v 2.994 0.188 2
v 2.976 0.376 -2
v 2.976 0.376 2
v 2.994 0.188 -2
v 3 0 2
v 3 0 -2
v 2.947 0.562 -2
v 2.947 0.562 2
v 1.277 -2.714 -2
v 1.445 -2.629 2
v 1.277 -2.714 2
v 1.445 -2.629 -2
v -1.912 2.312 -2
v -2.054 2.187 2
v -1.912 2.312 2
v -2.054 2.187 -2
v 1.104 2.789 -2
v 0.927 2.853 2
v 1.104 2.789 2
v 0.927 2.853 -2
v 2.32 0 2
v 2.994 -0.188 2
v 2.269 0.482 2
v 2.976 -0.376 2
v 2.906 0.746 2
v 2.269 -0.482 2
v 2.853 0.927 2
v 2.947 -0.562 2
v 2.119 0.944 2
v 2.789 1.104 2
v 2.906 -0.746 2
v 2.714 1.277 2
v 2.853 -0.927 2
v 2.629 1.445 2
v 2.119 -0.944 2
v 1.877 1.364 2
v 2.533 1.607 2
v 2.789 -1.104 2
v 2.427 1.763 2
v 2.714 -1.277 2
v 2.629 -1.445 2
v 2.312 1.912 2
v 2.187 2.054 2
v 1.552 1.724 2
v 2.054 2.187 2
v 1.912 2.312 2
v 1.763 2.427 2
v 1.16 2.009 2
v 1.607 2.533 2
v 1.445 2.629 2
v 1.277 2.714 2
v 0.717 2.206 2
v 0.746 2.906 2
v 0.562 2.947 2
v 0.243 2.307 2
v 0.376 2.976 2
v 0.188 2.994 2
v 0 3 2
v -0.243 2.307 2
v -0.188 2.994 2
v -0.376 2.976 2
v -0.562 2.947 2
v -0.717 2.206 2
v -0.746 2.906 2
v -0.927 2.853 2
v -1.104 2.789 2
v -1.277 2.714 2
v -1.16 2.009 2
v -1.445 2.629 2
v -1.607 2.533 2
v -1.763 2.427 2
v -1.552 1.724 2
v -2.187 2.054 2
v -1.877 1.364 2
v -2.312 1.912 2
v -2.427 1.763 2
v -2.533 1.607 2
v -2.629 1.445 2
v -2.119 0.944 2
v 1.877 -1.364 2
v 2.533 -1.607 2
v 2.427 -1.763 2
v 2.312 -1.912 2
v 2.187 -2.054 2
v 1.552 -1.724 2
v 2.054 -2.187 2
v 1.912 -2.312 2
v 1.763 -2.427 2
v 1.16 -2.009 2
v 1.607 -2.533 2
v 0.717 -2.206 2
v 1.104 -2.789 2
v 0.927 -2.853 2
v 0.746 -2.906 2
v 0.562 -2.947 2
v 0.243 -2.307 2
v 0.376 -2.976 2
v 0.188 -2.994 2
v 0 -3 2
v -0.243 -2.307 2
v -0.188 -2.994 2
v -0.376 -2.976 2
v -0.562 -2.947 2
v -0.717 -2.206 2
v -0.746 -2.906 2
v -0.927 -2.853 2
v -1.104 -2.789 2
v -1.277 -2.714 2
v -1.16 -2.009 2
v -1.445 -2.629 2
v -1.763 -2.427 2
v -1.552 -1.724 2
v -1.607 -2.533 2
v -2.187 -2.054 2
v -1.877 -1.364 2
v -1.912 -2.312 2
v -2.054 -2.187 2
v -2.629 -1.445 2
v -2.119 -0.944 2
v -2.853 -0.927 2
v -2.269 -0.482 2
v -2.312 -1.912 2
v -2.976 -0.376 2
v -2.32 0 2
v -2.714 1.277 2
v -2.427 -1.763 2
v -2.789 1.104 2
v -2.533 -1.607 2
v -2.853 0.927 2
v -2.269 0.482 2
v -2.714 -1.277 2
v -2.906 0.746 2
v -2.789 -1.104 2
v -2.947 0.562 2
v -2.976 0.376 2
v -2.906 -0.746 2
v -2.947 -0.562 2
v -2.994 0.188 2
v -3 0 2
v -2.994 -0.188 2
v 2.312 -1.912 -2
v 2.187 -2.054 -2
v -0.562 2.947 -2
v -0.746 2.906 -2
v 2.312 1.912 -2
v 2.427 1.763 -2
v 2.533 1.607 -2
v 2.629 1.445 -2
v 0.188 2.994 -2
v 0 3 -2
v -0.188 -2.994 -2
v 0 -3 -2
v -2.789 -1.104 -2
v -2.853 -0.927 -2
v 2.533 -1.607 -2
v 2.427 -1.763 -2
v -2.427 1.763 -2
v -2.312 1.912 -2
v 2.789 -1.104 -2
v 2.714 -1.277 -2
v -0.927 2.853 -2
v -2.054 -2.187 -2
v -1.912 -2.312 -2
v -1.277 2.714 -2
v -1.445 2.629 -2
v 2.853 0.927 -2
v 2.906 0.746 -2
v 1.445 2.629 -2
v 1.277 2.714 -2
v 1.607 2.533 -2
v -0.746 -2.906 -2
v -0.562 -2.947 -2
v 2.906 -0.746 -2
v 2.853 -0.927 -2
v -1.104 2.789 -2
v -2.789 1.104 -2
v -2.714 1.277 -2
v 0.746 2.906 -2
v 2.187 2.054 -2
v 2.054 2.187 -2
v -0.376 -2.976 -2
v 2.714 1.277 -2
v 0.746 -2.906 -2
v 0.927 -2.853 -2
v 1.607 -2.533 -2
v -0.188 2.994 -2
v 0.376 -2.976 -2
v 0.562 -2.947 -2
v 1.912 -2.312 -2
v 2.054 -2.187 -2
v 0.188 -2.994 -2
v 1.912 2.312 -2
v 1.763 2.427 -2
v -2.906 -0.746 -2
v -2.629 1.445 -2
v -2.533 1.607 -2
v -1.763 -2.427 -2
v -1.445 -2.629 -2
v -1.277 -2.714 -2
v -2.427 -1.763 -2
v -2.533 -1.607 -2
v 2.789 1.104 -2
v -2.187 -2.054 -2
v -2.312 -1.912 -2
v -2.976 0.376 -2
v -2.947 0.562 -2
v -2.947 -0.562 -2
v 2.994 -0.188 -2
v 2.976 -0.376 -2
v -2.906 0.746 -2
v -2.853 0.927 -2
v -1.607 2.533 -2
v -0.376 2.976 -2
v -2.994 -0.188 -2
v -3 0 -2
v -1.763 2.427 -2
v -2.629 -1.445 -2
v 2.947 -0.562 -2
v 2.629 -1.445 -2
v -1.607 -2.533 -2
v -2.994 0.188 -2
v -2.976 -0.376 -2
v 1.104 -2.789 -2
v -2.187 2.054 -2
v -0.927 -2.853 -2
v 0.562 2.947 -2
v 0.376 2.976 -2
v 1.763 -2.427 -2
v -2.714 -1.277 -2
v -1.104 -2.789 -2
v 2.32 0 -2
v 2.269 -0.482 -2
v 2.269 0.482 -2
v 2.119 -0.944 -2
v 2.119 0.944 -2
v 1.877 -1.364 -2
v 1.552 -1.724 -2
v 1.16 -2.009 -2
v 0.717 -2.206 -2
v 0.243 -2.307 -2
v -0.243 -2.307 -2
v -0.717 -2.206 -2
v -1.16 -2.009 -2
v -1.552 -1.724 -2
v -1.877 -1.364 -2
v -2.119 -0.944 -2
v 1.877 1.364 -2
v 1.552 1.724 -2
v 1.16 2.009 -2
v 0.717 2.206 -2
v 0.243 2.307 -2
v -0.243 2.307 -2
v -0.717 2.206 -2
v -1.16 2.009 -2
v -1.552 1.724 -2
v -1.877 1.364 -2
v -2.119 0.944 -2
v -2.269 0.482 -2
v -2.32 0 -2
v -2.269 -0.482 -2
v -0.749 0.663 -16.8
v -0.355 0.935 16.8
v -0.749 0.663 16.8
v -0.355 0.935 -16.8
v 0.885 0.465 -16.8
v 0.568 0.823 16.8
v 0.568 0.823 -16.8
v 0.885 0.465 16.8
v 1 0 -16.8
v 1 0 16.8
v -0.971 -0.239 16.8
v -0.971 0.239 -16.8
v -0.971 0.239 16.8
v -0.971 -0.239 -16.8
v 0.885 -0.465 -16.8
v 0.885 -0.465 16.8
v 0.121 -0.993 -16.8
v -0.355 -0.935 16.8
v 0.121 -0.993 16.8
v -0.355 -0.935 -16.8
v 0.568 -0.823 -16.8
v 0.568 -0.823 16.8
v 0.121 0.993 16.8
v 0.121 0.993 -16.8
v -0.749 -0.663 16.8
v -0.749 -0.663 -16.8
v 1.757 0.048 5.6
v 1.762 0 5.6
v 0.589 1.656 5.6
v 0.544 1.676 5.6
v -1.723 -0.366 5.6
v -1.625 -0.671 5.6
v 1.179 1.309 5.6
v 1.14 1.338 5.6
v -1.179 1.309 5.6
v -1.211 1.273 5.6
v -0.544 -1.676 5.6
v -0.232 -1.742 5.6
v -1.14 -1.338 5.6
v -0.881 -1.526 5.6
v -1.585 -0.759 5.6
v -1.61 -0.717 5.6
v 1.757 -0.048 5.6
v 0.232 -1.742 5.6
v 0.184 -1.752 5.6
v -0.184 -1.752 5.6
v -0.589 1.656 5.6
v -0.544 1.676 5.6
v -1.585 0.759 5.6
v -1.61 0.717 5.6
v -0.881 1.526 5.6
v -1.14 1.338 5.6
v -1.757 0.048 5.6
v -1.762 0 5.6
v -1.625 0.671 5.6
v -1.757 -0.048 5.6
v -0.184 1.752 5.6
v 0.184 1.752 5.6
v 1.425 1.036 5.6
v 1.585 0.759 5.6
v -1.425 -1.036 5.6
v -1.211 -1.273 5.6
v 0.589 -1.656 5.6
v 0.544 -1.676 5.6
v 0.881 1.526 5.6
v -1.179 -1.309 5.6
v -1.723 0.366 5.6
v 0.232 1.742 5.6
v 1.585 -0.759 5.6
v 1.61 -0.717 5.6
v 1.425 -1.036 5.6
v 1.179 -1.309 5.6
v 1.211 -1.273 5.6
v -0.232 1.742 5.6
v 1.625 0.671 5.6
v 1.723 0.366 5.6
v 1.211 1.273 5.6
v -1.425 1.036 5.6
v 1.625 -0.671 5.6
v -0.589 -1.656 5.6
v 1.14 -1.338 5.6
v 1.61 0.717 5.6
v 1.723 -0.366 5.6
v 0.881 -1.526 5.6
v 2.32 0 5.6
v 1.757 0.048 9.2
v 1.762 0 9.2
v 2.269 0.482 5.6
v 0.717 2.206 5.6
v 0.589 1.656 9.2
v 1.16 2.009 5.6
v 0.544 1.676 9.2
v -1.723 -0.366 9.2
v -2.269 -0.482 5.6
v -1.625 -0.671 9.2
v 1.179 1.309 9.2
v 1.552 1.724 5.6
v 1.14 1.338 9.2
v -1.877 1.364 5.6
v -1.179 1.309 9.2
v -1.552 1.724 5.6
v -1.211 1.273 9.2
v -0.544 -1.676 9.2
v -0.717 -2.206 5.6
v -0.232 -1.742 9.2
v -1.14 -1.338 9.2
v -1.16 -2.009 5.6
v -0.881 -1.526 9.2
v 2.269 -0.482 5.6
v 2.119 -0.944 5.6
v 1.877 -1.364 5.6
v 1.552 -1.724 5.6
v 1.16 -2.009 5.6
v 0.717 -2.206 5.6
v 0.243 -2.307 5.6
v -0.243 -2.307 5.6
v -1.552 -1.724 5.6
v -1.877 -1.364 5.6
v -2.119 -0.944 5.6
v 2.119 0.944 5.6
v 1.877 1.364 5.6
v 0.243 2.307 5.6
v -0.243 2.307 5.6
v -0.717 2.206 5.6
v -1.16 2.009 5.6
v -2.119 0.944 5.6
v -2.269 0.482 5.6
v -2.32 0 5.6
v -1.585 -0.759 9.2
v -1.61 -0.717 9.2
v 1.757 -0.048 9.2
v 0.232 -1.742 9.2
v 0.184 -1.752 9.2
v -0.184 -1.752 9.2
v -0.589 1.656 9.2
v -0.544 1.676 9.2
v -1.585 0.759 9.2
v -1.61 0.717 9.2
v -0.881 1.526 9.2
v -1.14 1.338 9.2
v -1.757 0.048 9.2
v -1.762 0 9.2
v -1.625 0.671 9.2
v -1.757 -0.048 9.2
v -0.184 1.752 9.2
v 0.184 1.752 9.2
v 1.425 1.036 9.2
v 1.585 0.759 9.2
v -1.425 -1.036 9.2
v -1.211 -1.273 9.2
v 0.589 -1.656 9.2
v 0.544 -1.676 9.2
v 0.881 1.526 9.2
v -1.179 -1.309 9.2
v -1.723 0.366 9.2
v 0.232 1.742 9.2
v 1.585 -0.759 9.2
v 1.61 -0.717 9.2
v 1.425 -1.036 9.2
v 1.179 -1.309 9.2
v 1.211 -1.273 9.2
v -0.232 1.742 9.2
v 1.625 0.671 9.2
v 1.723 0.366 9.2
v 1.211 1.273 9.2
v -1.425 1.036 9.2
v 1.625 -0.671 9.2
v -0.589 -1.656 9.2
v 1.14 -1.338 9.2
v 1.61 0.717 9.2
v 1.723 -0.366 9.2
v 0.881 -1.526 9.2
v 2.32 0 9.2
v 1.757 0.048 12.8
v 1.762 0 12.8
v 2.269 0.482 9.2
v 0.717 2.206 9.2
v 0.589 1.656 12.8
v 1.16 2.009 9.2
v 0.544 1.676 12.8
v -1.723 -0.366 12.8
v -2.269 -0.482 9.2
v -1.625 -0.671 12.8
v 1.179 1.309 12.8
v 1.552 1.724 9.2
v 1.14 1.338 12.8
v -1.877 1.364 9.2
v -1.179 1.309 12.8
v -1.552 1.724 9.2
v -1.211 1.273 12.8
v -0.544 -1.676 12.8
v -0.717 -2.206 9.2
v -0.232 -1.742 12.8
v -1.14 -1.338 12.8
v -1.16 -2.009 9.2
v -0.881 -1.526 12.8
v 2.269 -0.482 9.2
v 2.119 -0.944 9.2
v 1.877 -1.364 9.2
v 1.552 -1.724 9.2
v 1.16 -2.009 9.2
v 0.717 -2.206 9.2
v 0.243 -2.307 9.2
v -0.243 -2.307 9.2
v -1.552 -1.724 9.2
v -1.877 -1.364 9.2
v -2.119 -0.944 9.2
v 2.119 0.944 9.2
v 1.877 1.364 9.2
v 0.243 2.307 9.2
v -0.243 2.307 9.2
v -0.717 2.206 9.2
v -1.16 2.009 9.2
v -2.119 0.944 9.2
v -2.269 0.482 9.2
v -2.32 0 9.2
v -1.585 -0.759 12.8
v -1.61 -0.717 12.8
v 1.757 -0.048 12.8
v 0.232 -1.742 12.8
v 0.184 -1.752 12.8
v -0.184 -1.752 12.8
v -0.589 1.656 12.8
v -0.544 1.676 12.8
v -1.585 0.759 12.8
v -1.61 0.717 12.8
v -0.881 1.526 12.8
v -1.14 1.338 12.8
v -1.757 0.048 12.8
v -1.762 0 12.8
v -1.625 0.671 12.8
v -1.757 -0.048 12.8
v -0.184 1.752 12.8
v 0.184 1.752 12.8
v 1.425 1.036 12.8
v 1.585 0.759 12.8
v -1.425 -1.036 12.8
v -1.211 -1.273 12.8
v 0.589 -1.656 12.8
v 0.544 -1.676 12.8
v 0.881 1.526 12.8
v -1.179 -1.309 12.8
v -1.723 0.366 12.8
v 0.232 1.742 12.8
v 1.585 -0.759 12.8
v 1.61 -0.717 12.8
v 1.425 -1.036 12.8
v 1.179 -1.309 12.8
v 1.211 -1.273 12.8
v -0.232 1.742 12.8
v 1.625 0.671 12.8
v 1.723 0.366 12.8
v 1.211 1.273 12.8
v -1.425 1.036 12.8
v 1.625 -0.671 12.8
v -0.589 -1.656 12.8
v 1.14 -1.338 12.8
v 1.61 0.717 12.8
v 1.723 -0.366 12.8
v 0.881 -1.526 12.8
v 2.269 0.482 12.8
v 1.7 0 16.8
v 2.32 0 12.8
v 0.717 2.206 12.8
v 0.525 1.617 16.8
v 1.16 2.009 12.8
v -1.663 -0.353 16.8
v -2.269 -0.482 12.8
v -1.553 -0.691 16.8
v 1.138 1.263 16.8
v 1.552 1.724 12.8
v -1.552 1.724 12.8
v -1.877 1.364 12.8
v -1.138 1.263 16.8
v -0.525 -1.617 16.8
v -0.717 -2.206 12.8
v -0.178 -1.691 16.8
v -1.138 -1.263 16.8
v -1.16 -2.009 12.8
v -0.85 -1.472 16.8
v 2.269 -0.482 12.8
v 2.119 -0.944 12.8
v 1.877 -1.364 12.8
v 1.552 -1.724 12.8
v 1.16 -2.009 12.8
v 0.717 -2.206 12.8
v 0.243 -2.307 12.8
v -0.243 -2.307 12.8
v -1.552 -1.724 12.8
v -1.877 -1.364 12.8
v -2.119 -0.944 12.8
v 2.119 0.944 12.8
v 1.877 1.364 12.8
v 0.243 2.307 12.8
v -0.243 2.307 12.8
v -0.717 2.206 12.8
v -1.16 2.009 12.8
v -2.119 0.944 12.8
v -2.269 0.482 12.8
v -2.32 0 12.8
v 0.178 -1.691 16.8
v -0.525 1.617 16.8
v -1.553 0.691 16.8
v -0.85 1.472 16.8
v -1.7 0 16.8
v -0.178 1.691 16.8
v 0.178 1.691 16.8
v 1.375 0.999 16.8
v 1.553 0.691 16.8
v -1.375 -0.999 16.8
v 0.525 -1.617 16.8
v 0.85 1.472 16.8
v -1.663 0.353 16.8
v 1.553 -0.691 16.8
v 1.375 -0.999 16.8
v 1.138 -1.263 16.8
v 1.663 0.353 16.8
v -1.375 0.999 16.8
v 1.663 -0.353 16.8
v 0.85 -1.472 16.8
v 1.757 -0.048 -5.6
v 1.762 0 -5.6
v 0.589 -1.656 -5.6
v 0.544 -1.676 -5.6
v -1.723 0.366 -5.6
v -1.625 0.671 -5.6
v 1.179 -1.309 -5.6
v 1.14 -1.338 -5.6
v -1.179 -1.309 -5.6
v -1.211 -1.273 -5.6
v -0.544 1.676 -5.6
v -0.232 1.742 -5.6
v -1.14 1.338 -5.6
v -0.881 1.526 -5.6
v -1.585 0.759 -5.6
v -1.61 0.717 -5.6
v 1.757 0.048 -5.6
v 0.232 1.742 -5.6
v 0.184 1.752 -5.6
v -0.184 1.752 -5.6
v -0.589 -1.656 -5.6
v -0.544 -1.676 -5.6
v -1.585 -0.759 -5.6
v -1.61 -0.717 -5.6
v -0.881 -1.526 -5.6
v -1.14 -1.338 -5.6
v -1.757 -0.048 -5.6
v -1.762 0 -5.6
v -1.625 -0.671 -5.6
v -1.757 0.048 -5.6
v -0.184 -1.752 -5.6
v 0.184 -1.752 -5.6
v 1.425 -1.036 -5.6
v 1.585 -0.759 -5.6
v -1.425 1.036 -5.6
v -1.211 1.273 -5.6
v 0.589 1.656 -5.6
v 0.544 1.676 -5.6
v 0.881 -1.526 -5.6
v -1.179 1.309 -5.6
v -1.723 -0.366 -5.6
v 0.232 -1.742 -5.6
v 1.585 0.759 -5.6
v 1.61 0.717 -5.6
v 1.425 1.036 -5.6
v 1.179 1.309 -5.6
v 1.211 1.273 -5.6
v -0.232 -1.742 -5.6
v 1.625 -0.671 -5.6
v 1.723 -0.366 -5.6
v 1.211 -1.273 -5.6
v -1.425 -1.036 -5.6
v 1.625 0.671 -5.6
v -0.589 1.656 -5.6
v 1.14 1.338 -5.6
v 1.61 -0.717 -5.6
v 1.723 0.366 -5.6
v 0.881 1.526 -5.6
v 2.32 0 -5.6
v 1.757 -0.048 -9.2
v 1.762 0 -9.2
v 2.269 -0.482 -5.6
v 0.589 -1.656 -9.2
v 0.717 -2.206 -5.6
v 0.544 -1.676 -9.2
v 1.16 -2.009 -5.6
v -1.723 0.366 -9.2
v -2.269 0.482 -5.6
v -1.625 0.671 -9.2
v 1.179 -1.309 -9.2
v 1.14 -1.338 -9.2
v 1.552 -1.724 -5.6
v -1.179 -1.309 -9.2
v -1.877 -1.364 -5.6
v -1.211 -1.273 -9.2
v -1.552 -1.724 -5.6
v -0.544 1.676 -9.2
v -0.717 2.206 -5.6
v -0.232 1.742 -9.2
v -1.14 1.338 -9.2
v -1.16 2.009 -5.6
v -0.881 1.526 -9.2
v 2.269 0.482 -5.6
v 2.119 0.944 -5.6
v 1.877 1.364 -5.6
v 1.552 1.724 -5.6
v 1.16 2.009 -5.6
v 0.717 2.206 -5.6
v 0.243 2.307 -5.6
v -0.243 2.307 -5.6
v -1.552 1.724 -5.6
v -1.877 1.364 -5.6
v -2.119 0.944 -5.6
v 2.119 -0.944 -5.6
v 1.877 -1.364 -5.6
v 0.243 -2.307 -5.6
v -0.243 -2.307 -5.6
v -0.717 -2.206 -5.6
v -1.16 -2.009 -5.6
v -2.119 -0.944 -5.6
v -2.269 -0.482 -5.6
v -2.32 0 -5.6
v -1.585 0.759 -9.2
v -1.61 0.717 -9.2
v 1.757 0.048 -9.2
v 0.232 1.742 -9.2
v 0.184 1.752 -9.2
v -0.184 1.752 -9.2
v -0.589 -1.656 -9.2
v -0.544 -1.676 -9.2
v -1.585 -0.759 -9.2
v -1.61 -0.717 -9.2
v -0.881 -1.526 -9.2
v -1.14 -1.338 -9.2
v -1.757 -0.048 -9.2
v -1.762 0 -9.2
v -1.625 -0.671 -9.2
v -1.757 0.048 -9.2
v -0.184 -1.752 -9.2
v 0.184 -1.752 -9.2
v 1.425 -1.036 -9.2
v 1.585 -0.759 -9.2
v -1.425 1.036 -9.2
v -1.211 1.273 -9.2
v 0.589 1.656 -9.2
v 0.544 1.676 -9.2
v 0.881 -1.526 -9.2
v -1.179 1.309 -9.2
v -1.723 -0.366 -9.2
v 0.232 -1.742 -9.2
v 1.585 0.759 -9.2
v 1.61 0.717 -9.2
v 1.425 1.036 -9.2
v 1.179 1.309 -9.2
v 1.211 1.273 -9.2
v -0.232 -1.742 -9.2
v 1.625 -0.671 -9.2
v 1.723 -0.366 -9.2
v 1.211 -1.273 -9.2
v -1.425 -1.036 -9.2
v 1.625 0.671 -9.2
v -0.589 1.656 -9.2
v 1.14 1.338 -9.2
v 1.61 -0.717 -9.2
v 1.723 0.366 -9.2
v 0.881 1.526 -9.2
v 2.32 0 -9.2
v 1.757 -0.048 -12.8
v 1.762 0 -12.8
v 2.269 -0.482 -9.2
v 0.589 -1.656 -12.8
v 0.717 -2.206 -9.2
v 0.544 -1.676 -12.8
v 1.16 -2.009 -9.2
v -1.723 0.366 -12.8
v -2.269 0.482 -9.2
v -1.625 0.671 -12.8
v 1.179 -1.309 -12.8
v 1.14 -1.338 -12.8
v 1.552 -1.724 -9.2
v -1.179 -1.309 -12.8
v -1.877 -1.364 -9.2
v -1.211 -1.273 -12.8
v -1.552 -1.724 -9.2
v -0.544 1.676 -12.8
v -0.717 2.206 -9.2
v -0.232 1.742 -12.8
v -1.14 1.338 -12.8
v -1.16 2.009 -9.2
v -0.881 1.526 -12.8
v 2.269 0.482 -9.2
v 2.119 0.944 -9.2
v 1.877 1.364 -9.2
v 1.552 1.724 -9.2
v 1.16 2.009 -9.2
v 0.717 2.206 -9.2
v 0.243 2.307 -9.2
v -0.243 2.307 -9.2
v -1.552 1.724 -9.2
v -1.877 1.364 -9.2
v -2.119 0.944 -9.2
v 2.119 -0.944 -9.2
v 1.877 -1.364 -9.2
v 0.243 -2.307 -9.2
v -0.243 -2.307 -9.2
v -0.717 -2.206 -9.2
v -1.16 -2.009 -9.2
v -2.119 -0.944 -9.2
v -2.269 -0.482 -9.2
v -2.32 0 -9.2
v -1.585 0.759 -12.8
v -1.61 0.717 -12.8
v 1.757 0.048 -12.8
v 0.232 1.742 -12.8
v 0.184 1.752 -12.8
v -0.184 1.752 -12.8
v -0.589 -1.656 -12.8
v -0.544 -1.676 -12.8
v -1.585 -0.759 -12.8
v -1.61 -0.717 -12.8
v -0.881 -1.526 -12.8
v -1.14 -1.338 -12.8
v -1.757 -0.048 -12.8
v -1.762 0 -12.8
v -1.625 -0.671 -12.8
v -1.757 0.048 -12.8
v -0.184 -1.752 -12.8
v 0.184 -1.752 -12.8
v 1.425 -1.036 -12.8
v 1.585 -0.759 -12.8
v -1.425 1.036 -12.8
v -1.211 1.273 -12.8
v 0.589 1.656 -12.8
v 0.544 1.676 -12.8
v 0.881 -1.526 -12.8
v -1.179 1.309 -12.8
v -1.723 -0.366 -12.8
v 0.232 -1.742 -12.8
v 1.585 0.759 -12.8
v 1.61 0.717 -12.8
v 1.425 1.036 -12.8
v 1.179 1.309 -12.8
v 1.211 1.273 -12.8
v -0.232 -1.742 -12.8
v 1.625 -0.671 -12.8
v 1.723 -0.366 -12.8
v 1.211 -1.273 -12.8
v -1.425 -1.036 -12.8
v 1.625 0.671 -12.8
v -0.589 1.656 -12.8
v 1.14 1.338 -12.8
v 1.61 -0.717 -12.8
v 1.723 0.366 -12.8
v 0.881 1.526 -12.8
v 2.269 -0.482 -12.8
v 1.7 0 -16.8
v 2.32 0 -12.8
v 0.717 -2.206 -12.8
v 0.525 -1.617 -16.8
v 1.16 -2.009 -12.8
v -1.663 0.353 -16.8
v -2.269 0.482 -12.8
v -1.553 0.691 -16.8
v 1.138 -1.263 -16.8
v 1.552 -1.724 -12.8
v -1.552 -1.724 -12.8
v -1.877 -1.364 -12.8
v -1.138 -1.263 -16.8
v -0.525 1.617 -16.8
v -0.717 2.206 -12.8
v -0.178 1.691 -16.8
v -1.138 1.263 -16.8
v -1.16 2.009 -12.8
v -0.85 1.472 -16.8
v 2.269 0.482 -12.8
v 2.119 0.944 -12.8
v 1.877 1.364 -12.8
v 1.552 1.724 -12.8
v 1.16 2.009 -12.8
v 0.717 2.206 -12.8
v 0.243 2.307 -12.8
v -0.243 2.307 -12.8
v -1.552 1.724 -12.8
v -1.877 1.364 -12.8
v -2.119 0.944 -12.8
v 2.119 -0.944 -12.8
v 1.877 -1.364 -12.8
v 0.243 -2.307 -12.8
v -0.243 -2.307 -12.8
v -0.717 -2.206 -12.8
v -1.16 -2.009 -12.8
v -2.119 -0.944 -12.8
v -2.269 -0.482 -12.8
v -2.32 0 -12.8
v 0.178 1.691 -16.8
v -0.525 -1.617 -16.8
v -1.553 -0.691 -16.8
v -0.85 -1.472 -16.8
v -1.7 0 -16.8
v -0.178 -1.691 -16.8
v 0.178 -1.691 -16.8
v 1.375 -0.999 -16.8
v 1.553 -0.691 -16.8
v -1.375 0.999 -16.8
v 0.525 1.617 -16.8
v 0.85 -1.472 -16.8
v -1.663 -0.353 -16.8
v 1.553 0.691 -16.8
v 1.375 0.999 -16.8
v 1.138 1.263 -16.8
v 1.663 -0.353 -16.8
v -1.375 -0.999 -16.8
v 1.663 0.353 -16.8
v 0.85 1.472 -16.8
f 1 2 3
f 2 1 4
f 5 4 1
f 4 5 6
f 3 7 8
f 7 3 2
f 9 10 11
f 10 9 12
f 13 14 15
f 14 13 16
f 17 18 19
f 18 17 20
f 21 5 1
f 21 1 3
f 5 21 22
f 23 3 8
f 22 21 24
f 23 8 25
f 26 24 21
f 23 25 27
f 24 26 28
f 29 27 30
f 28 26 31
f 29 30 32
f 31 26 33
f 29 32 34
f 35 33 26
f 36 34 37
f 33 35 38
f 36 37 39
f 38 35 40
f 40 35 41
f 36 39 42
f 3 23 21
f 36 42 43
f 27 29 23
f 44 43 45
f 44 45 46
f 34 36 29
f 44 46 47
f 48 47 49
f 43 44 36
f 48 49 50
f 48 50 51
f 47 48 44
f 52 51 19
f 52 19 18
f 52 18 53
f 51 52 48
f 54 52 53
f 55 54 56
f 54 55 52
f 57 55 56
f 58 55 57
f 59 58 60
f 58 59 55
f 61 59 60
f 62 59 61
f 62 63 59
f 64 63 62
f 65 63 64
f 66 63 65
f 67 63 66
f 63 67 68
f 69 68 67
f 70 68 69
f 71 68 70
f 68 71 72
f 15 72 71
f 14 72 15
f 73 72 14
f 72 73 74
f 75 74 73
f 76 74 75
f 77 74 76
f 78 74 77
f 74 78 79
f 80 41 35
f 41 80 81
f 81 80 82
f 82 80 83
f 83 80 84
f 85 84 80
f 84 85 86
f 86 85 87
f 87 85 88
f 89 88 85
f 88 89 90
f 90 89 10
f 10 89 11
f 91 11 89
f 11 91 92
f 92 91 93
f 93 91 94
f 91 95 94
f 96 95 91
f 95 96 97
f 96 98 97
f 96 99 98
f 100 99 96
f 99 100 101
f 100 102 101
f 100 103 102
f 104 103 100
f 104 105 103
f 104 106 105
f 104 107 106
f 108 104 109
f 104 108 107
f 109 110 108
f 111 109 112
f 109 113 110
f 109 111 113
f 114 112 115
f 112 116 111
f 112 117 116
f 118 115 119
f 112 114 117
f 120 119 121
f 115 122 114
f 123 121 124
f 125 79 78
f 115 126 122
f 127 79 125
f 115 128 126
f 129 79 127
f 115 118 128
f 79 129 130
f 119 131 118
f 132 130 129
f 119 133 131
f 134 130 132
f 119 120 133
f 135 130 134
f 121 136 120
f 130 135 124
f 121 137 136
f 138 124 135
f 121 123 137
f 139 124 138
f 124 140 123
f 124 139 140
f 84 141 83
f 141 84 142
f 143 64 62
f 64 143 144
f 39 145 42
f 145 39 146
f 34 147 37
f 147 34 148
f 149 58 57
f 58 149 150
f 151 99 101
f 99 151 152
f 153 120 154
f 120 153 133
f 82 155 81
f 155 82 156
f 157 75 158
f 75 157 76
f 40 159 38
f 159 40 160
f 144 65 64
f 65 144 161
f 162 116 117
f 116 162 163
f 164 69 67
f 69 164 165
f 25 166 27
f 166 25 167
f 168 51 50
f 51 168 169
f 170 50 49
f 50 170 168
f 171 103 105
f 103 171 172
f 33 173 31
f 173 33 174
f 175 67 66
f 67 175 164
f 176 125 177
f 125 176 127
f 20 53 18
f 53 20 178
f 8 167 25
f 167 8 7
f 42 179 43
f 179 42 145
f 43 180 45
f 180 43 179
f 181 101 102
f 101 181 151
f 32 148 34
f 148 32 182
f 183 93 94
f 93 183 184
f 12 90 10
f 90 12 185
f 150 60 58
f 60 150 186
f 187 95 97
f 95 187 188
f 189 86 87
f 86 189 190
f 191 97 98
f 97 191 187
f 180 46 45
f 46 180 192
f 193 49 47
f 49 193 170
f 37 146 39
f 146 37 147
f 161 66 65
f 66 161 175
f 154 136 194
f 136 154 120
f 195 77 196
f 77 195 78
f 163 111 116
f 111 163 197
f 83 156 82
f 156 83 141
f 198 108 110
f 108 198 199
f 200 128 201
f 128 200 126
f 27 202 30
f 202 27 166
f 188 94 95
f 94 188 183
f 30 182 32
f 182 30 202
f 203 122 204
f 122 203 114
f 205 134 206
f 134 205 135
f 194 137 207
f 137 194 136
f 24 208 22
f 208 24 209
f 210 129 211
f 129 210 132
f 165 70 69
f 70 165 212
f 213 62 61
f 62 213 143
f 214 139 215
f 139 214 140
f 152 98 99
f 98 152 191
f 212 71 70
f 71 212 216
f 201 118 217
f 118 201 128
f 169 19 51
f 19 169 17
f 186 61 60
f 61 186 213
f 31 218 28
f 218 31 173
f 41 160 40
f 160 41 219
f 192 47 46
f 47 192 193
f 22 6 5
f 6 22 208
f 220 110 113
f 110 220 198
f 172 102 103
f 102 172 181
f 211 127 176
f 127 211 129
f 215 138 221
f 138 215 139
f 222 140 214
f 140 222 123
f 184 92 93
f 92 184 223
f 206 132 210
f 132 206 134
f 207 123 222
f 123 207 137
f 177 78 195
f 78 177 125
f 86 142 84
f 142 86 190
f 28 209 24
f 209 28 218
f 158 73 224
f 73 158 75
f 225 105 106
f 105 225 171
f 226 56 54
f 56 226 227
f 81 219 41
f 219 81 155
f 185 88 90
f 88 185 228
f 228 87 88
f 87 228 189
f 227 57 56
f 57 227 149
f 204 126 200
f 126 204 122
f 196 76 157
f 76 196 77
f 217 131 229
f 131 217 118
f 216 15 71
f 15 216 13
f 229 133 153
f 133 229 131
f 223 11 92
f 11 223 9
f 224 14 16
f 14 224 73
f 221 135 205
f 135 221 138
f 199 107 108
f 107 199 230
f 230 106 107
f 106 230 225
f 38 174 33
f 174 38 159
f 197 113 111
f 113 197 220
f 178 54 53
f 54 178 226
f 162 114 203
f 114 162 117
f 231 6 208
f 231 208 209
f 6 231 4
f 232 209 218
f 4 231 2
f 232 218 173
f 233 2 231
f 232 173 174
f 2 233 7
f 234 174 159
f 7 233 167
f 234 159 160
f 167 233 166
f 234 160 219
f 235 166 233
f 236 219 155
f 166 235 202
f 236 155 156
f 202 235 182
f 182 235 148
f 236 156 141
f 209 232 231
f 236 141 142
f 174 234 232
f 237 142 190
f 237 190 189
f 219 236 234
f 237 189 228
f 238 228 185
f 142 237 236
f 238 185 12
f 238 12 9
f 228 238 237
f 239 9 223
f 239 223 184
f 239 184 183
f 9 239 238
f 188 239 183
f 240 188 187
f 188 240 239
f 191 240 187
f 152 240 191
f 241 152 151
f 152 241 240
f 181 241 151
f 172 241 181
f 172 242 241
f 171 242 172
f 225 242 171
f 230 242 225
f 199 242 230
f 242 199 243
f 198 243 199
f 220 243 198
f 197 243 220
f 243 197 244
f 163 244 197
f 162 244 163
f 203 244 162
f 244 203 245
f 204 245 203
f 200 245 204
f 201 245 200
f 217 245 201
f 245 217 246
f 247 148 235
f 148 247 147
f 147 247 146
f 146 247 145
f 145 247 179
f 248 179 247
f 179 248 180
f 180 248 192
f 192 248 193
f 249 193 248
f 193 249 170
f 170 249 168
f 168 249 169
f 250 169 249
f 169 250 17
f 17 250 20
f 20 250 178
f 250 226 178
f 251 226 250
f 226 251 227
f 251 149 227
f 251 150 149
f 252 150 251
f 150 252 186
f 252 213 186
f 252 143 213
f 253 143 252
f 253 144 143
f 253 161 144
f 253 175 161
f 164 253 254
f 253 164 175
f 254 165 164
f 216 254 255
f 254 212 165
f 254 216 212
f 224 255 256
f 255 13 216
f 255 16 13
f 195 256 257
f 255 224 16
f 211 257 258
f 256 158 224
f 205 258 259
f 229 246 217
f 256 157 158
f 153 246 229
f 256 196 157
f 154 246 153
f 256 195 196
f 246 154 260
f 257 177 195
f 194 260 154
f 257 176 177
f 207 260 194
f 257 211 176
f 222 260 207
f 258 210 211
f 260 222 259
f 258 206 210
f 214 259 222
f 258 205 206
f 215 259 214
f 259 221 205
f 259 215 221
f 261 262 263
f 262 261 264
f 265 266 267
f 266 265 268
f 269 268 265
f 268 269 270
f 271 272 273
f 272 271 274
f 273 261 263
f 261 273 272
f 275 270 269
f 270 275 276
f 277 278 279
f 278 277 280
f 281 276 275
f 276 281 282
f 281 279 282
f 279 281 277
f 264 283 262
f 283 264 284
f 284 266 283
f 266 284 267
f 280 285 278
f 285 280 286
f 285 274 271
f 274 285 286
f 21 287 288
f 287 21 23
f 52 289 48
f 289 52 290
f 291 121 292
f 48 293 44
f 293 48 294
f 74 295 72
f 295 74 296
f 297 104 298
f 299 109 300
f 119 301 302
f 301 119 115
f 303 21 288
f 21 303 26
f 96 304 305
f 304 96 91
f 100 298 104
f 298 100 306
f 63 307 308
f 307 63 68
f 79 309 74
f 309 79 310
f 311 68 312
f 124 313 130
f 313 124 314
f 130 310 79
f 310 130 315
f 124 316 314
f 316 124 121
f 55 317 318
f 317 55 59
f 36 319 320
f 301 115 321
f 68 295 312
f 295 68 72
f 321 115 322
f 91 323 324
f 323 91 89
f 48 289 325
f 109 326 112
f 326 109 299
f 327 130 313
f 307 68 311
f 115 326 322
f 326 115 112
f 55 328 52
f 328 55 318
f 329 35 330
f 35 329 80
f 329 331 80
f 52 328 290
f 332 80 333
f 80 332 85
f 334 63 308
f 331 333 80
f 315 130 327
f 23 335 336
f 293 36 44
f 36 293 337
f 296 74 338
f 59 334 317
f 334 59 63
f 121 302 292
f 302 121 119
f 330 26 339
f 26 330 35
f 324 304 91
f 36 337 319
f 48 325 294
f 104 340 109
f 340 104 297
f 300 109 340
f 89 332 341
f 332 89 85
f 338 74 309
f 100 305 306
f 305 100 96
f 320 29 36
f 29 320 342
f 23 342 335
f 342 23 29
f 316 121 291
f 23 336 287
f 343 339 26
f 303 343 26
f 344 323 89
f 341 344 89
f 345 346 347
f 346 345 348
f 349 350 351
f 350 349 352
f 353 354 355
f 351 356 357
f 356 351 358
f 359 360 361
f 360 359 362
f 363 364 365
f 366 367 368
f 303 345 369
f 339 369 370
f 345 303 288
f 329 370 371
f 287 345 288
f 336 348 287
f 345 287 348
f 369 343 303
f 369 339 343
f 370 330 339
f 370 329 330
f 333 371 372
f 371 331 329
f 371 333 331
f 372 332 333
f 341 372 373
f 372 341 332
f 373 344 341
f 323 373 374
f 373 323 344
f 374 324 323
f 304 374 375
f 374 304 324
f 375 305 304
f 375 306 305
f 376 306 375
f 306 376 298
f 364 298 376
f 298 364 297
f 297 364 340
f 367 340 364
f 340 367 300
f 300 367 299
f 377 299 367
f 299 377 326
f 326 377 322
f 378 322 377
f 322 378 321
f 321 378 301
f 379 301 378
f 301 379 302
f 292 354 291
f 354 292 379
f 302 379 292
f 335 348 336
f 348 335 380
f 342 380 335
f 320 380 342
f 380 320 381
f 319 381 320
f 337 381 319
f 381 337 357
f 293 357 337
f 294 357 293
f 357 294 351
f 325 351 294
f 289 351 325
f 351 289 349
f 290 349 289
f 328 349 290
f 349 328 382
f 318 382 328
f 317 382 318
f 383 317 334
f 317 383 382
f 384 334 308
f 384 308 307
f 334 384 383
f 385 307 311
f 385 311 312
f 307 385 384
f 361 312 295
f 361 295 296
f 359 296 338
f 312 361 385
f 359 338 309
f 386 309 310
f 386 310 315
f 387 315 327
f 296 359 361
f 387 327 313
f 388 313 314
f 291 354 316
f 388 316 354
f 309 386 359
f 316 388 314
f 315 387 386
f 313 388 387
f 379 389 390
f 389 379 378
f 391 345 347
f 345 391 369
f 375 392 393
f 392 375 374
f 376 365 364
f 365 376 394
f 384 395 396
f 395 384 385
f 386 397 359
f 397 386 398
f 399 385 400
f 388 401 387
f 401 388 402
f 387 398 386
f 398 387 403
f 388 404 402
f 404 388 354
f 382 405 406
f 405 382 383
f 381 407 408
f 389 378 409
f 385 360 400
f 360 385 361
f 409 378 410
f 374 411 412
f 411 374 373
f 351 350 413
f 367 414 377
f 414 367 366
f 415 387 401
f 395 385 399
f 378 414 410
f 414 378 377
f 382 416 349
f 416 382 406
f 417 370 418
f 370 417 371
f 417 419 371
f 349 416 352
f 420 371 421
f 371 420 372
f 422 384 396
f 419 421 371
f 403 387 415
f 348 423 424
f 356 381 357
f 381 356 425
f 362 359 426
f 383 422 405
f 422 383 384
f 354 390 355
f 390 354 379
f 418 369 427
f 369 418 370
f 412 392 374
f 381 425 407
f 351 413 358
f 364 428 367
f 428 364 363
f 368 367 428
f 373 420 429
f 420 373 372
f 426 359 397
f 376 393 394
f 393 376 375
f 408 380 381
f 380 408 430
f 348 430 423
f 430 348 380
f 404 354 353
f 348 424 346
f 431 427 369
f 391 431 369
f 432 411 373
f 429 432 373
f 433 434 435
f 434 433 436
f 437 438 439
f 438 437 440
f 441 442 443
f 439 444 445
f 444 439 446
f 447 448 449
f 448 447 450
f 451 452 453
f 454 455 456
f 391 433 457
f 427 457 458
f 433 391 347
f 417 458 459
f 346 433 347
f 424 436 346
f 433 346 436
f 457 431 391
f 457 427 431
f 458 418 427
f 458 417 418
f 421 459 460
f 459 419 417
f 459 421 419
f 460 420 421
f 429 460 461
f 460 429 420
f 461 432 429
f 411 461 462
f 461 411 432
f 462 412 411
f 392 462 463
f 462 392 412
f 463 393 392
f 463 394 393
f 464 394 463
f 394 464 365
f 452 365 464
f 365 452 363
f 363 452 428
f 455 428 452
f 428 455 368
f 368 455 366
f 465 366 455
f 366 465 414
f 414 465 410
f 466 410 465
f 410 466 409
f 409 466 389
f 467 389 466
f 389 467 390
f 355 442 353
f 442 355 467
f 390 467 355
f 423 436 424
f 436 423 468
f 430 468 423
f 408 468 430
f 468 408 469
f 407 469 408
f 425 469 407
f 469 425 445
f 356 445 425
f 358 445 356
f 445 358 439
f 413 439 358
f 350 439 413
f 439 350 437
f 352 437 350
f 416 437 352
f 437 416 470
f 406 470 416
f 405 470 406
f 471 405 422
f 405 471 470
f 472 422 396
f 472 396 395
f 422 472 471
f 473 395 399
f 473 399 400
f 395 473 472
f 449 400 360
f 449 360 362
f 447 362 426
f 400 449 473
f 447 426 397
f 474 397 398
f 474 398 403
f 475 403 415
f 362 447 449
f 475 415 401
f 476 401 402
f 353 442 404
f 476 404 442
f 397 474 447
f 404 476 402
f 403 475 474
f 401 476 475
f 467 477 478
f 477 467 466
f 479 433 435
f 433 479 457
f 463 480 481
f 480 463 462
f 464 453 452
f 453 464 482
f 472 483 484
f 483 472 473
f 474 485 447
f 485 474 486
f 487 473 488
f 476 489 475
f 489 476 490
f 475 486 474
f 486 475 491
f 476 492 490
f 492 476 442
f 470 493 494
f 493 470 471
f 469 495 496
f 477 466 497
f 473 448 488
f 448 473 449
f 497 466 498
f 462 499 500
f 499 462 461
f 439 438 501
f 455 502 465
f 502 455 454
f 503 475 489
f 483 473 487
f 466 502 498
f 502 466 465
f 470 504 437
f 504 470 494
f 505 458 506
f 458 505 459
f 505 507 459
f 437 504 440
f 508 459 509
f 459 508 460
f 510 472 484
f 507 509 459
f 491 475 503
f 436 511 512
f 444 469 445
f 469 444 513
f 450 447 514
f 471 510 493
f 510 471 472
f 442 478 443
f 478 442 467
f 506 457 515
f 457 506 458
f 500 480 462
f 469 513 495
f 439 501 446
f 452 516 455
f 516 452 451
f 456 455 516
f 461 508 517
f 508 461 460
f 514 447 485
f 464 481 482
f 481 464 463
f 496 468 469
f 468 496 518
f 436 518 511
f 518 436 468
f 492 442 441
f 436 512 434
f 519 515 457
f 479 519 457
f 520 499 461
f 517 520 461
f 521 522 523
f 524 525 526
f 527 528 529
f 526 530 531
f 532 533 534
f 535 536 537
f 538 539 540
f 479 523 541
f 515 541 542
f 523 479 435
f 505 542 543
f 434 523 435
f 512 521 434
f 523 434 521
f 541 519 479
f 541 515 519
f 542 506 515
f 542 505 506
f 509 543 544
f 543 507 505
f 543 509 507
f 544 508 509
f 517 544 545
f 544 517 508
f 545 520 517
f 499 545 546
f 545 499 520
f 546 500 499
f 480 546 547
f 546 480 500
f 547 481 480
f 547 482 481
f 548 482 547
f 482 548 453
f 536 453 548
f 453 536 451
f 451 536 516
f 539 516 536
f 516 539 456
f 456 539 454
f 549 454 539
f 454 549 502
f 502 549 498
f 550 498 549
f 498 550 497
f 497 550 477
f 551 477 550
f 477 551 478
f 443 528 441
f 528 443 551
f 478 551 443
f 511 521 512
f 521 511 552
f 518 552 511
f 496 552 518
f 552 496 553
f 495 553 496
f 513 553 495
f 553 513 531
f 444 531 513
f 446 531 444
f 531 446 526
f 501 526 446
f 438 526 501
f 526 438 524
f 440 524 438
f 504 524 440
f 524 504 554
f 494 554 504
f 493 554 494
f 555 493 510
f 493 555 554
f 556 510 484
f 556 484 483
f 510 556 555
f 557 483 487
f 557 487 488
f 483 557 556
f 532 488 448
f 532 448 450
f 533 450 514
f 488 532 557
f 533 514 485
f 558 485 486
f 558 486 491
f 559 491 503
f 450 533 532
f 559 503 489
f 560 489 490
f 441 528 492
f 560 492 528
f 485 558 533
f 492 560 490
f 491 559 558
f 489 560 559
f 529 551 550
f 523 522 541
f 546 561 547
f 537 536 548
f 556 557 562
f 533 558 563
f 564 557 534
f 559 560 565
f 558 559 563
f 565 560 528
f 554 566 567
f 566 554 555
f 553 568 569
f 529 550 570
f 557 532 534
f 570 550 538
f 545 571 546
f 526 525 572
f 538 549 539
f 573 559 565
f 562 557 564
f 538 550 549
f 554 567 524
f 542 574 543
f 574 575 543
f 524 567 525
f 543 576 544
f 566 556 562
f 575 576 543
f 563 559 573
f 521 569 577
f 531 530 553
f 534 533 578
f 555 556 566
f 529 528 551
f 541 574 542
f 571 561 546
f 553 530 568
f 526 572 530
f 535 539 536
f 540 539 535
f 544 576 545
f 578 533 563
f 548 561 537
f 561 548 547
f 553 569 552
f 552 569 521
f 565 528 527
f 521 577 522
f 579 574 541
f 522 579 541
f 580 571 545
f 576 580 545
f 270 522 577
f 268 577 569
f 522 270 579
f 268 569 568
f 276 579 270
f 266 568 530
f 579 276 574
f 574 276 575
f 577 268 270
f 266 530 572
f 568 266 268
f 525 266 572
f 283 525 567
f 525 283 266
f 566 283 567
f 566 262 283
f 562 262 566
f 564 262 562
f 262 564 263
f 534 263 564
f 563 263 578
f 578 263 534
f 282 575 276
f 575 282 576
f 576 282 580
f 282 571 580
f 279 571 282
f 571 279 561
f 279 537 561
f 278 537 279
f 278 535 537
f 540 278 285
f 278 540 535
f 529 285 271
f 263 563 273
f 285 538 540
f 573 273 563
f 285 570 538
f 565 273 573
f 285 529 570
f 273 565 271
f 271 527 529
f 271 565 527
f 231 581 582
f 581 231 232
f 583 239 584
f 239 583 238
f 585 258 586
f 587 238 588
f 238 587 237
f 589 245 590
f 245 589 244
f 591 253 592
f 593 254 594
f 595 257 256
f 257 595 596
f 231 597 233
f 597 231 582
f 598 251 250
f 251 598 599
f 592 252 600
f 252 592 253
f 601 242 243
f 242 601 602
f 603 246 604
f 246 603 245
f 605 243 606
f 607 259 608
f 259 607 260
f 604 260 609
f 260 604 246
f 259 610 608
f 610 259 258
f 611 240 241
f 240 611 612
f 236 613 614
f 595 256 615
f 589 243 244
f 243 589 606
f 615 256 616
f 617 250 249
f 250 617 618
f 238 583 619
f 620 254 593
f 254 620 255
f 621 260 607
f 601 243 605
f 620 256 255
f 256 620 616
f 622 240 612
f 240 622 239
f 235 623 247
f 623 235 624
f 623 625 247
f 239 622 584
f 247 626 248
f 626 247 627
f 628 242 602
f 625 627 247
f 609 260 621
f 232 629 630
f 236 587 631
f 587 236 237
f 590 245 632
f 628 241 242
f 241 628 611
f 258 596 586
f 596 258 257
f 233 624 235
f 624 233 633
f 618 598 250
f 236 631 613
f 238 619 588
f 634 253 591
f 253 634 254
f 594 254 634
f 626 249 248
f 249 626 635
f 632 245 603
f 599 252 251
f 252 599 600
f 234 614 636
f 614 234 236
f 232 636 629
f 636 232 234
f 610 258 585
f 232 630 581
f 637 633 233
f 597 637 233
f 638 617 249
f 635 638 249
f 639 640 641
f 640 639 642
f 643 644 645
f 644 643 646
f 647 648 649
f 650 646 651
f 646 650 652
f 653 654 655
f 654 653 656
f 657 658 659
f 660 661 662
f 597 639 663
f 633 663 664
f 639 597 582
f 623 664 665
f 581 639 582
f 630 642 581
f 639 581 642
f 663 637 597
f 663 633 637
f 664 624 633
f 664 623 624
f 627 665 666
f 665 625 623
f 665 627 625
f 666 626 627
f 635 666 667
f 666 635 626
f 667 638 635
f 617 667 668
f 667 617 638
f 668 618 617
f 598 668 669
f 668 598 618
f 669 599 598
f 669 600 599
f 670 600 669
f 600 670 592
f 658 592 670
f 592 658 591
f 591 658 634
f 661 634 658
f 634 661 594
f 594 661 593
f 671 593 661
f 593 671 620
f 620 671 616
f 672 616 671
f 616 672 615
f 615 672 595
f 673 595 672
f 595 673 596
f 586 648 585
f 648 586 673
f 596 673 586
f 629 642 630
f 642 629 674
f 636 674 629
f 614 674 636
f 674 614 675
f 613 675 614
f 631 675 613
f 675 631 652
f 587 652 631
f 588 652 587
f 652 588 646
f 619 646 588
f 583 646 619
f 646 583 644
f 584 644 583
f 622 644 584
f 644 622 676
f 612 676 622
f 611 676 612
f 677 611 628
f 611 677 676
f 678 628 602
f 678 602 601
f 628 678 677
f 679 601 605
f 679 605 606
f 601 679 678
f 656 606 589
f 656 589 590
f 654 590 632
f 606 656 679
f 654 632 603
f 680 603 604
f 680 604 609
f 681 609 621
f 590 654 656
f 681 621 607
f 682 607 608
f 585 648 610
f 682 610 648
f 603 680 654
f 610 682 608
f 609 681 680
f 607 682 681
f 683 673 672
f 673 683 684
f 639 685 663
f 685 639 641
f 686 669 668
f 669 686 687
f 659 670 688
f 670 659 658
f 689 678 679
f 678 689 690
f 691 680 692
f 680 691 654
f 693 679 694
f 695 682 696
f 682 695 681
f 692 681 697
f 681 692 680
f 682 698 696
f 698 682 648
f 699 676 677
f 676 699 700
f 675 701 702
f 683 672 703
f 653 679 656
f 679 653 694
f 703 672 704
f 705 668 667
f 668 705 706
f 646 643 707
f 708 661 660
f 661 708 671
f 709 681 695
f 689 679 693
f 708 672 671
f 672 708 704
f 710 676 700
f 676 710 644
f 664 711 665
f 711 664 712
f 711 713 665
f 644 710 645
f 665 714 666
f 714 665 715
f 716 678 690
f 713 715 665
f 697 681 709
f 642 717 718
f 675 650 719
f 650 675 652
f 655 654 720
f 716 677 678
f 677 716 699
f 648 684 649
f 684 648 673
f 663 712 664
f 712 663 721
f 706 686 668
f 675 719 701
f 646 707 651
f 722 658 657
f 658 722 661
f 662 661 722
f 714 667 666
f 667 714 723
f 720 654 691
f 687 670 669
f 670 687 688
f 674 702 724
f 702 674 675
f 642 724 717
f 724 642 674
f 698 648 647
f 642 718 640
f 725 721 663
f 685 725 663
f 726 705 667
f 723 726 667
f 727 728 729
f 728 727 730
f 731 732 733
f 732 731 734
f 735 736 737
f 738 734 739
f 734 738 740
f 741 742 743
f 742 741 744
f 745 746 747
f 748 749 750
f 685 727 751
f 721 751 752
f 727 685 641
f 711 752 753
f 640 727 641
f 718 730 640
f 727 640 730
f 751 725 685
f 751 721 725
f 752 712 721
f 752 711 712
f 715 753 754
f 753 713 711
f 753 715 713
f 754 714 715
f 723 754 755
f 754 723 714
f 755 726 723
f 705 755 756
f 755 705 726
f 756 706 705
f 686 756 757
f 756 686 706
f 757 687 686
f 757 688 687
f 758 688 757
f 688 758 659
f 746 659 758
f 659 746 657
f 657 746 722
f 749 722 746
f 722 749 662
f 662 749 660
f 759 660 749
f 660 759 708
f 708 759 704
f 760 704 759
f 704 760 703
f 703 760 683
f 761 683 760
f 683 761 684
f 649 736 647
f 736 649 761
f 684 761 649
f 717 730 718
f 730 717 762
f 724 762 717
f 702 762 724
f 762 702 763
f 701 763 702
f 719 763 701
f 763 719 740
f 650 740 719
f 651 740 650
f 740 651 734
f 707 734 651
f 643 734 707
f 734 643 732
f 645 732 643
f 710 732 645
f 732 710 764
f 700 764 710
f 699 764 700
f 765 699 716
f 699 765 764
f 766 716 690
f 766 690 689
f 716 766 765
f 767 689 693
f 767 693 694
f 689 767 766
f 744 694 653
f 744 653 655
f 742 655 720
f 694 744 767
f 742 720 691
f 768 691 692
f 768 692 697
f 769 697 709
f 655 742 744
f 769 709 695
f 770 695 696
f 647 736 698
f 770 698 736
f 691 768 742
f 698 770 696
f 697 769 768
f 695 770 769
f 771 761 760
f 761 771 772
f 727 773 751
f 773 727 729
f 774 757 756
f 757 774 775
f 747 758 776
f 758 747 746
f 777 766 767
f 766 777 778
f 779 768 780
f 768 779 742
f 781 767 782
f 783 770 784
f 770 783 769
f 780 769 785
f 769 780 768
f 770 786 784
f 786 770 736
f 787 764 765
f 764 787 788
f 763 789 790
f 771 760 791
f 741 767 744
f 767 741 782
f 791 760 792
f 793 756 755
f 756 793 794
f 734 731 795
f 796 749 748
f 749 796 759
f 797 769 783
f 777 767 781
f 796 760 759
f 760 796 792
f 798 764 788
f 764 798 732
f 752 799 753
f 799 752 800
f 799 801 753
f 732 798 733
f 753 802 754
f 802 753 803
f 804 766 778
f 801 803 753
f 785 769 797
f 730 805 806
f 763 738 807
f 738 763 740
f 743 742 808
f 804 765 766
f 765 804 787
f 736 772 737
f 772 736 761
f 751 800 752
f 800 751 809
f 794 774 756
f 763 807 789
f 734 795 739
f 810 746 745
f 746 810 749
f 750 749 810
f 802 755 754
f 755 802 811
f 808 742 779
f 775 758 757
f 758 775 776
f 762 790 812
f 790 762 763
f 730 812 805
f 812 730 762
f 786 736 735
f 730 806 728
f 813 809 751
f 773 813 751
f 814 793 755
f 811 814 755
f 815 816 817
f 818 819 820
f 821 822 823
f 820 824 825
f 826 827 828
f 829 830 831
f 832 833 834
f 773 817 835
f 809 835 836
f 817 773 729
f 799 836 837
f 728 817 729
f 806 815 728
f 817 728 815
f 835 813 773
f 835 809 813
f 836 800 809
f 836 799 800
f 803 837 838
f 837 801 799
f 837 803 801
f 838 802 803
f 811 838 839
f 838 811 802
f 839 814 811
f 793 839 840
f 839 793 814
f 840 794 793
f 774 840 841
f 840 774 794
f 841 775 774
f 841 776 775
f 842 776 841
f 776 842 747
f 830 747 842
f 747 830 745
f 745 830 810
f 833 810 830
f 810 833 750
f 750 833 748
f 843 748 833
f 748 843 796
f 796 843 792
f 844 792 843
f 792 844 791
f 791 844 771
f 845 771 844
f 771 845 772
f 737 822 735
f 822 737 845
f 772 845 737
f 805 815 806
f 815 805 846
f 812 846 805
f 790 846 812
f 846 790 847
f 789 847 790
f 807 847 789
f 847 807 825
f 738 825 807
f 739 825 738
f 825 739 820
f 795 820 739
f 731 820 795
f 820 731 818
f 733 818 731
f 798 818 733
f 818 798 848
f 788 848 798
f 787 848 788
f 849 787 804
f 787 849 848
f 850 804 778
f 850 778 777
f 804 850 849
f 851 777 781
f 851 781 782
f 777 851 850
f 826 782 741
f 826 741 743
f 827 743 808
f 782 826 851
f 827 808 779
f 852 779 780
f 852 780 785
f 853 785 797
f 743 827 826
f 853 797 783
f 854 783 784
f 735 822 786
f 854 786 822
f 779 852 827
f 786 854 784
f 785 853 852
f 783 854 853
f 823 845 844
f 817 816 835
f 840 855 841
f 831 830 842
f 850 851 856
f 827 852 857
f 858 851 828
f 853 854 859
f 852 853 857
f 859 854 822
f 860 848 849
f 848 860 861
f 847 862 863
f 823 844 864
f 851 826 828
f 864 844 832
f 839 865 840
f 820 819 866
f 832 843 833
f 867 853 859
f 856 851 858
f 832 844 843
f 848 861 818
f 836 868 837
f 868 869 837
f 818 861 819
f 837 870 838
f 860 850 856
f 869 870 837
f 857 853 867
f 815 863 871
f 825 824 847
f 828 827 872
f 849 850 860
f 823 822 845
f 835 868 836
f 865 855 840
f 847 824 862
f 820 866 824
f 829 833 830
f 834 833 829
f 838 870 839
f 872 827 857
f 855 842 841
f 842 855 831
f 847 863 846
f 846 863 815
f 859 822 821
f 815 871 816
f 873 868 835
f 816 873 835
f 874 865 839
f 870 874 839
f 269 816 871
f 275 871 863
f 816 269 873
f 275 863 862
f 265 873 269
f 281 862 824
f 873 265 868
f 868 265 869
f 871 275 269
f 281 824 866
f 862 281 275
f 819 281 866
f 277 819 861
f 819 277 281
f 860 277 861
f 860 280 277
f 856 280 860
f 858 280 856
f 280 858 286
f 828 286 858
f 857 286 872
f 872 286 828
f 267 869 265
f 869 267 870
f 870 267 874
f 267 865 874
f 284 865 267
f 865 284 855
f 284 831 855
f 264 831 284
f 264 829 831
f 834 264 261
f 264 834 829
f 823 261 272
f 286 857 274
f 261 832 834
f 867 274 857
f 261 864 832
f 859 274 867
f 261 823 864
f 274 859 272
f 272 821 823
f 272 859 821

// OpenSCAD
/*
Adapted from: Hose barb adapter and manifold by papergeek  www.thingiverse.com/thing:158717


This version gives you a few different options you can change the shape of the middle section on a two way connector so that it is round or hex shaped. the option to add multiple connections in two different sizes.

update 5/3/2016

Added the option to create a "L" shaped two way connection.

*/
// Number of tubes size A's to connect. 
Number_of_Size_A = 2;
// Number of tubes size B's to connect. Size A should be the smaller hose
Number_of_Size_B = 0;

// Hose A inside diameter or bore
Size_A = 4; 
// Hose B inside diameter or bore
Size_B = 8; 

// Manifold Bore = Size - Wall Thickness thicker walls are stronger but have a smaller bore. 
// Wall_Thickness_n must be less than Size_n

// Wall_Thickness_A must be less than Size_A
Wall_Thickness_A = 1;
// Wall_Thickness_B must be less than Size_B
Wall_Thickness_B = 1;

// on 3 and 4 port connectors you can choose if the manifold is square "T" or polygon "Y" OR "L" for a two port connector at right angles
junction_type = "T"; // [Y, T, L]

// Number of barbs on output - try 3 for larger tubing to reduce overall print height try 4 for smaller tubing
Size_A_barb_count = 4;
Size_B_barb_count = 3;

// For 2 port(inline) connectors the shoulder can be hexagional to fit a spanner or round
Inline_Connector = "round"; // [round, hex]
// Size across the flats of the Hex
Hex_Size = 8; 
// How much shoulder overhanging the largest port on round inline connectors.
Shoulder = 1;


// Hidden Variables used throught the sketch dont't sugest changing these
Size_A_Bore = Size_A - (Wall_Thickness_A * 2);
Size_B_Bore = Size_B - (Wall_Thickness_B * 2);
//change manifold to hex shaped
Edges = Inline_Connector == "hex" ? 6 : 100 ; 

Number_of_Faces = Number_of_Size_A + Number_of_Size_B;


// create inline connector
if (Number_of_Faces == 2 && junction_type !="L")
{
  Size = Number_of_Size_A == 2 ? Size_A : Size_B ;
  HYP = (Hex_Size / 2) / cos(30);
  Size_1 = Inline_Connector == "hex" ? (HYP * 2) : (Size + 2*Shoulder) ; // size of manifols 
  Bore_1 = Number_of_Size_A > 1 ? Size_A_Bore : Size_B_Bore ; 
  Bore_2 = Number_of_Size_A > 0 ? Size_A_Bore : Size_B_Bore ;

  union()
  {
    difference()
    {
      cylinder( h = Size , d = Size_1, center = true, $fa = 0.5, $fs = 0.5, $fn = Edges )  ;
      cylinder(h = Size + 1, d1 = Bore_1, d2 = Bore_2, center = true, $fa = 0.5, $fs = 0.5 );
    }

// Top port
    translate([0, 0, Size / 2])
    {
      if (Number_of_Size_A > 0)
      {
        connector_size_A();
      }
      else
      {
        connector_size_B();
      }
    }
// Bottom port
    translate([0, 0, -Size / 2])rotate([180, 0, 0])
    {
      if (Number_of_Size_A == 2)
      {
        connector_size_A();
      }
      else
      {
        connector_size_B();
      }
    }
  }
}

// Multi port manifold

if (Number_of_Faces > 2 || junction_type == "L")
{
  Port_Height = Number_of_Size_B > 0 ? Size_B : Size_A ;
  Port_Bore = Number_of_Size_B > 0 ? Size_B_Bore : Size_A_Bore;
  Face_Height = Port_Height * 1.5;

  junction = Number_of_Faces > 4 ? "Y" : junction_type  ;
  Smooth = Inline_Connector == "round" ? Number_of_Faces + 100 : Number_of_Faces;

  angleA = (360 / (Number_of_Size_A + Number_of_Size_B));
  angleB = 90;
  angle = junction == "Y" ? angleA : angleB ;

      /*  To calculate the Apothem (or radius of a polygon's inner circle)
        Apothem = R * Cos *(180/N)

          where:
          R = radius of polygons outer circle or circumcircle
          N = number of sides/faces
    */
  Radius = (Port_Height* 1.16 ) / (2 * sin(180 / Number_of_Faces));
  Apothem  = junction == "L" ? Port_Height* 1.16 : (Radius + 4) * cos(180 / Number_of_Faces) ;
//  Apothem = (Radius + 4) * cos(180 / Number_of_Faces);



// create body of manifold  
  union()
  {
    difference()
    {
      if ( junction == "Y")
      {
        rotate([0, 0, angle / 2])cylinder( h = Face_Height , r = Radius + 4, center = true, $fa = 0.5, $fs = 0.5, $fn = Smooth )  ;
      }
      if (junction == "T")
      {
        cube( Apothem *2 , center = true, $fa = 0.5, $fs = 0.5);
      }
      if ( junction == "L")
      {
        cube( Apothem * 2 , center = true, $fa = 0.5, $fs = 0.5);
      }
      
      cylinder( h = Port_Bore , d = Port_Height, center = true, $fa = 0.5, $fs = 0.5, $fn = Number_of_Faces )  ;

// bore holes for the ports
      if (Number_of_Size_A > 0)
      {
        for (n = [1:Number_of_Size_A ])
        {
          rotate([angle * n, 90, 0]) cylinder( h = Apothem *2 , d = Size_A_Bore, center = false, $fa = 0.5, $fs = 0.5);
        }
      }
      if (Number_of_Size_B > 0)
      {
        for (n = [1:Number_of_Size_B  ])
        {
          rotate([(angle * n) + (angle * Number_of_Size_A), 90, 0]) cylinder( h = Apothem *2 , d = Size_B_Bore, center = false, $fa = 0.5, $fs = 0.5);
        }
      }


    }
// Add the ports
    
    if (Number_of_Size_A > 0)
    {
      for (i = [1:Number_of_Size_A ])
      {
        rotate([angle * i, 90, 0])translate([0, 0, Apothem - 0.5])  connector_size_A();
      }
    }
    if (Number_of_Size_B > 0)
    {
      for (i = [1:Number_of_Size_B ])
      {
        rotate([(angle * i) + (angle * Number_of_Size_A), 90, 0])translate([0, 0, Apothem - 0.5])  connector_size_B();
      }
    }
  }
}



module connector_size_A()
{
  difference()
  {
    union()
    {
      for ( i = [1:Size_A_barb_count])
      {
        translate([0, 0, (i - 1) * Size_A * 0.9]) cylinder( h = Size_A , r2 = Size_A * 0.85 / 2, r1 = Size_A * 1.16 / 2, $fa = 0.5, $fs = 0.5 );

      }
    }
    translate([0, 0, -0.1]) cylinder( h = Size_A * Size_A_barb_count , d = Size_A_Bore , $fa = 0.5, $fs = 0.5 );
  }
}
module connector_size_B()
{
  difference()
  {
    union()
    {
      for ( i = [1:Size_B_barb_count])
      {
        translate([0, 0, (i - 1) * Size_B * 0.9]) cylinder( h = Size_B , r2 = Size_B * 0.85 / 2, r1 = Size_B * 1.16 / 2, $fa = 0.5, $fs = 0.5 );

      }
    }
    translate([0, 0, -0.1]) cylinder( h = Size_B * Size_B_barb_count , d = Size_B_Bore , $fa = 0.5, $fs = 0.5 );
  }
}
